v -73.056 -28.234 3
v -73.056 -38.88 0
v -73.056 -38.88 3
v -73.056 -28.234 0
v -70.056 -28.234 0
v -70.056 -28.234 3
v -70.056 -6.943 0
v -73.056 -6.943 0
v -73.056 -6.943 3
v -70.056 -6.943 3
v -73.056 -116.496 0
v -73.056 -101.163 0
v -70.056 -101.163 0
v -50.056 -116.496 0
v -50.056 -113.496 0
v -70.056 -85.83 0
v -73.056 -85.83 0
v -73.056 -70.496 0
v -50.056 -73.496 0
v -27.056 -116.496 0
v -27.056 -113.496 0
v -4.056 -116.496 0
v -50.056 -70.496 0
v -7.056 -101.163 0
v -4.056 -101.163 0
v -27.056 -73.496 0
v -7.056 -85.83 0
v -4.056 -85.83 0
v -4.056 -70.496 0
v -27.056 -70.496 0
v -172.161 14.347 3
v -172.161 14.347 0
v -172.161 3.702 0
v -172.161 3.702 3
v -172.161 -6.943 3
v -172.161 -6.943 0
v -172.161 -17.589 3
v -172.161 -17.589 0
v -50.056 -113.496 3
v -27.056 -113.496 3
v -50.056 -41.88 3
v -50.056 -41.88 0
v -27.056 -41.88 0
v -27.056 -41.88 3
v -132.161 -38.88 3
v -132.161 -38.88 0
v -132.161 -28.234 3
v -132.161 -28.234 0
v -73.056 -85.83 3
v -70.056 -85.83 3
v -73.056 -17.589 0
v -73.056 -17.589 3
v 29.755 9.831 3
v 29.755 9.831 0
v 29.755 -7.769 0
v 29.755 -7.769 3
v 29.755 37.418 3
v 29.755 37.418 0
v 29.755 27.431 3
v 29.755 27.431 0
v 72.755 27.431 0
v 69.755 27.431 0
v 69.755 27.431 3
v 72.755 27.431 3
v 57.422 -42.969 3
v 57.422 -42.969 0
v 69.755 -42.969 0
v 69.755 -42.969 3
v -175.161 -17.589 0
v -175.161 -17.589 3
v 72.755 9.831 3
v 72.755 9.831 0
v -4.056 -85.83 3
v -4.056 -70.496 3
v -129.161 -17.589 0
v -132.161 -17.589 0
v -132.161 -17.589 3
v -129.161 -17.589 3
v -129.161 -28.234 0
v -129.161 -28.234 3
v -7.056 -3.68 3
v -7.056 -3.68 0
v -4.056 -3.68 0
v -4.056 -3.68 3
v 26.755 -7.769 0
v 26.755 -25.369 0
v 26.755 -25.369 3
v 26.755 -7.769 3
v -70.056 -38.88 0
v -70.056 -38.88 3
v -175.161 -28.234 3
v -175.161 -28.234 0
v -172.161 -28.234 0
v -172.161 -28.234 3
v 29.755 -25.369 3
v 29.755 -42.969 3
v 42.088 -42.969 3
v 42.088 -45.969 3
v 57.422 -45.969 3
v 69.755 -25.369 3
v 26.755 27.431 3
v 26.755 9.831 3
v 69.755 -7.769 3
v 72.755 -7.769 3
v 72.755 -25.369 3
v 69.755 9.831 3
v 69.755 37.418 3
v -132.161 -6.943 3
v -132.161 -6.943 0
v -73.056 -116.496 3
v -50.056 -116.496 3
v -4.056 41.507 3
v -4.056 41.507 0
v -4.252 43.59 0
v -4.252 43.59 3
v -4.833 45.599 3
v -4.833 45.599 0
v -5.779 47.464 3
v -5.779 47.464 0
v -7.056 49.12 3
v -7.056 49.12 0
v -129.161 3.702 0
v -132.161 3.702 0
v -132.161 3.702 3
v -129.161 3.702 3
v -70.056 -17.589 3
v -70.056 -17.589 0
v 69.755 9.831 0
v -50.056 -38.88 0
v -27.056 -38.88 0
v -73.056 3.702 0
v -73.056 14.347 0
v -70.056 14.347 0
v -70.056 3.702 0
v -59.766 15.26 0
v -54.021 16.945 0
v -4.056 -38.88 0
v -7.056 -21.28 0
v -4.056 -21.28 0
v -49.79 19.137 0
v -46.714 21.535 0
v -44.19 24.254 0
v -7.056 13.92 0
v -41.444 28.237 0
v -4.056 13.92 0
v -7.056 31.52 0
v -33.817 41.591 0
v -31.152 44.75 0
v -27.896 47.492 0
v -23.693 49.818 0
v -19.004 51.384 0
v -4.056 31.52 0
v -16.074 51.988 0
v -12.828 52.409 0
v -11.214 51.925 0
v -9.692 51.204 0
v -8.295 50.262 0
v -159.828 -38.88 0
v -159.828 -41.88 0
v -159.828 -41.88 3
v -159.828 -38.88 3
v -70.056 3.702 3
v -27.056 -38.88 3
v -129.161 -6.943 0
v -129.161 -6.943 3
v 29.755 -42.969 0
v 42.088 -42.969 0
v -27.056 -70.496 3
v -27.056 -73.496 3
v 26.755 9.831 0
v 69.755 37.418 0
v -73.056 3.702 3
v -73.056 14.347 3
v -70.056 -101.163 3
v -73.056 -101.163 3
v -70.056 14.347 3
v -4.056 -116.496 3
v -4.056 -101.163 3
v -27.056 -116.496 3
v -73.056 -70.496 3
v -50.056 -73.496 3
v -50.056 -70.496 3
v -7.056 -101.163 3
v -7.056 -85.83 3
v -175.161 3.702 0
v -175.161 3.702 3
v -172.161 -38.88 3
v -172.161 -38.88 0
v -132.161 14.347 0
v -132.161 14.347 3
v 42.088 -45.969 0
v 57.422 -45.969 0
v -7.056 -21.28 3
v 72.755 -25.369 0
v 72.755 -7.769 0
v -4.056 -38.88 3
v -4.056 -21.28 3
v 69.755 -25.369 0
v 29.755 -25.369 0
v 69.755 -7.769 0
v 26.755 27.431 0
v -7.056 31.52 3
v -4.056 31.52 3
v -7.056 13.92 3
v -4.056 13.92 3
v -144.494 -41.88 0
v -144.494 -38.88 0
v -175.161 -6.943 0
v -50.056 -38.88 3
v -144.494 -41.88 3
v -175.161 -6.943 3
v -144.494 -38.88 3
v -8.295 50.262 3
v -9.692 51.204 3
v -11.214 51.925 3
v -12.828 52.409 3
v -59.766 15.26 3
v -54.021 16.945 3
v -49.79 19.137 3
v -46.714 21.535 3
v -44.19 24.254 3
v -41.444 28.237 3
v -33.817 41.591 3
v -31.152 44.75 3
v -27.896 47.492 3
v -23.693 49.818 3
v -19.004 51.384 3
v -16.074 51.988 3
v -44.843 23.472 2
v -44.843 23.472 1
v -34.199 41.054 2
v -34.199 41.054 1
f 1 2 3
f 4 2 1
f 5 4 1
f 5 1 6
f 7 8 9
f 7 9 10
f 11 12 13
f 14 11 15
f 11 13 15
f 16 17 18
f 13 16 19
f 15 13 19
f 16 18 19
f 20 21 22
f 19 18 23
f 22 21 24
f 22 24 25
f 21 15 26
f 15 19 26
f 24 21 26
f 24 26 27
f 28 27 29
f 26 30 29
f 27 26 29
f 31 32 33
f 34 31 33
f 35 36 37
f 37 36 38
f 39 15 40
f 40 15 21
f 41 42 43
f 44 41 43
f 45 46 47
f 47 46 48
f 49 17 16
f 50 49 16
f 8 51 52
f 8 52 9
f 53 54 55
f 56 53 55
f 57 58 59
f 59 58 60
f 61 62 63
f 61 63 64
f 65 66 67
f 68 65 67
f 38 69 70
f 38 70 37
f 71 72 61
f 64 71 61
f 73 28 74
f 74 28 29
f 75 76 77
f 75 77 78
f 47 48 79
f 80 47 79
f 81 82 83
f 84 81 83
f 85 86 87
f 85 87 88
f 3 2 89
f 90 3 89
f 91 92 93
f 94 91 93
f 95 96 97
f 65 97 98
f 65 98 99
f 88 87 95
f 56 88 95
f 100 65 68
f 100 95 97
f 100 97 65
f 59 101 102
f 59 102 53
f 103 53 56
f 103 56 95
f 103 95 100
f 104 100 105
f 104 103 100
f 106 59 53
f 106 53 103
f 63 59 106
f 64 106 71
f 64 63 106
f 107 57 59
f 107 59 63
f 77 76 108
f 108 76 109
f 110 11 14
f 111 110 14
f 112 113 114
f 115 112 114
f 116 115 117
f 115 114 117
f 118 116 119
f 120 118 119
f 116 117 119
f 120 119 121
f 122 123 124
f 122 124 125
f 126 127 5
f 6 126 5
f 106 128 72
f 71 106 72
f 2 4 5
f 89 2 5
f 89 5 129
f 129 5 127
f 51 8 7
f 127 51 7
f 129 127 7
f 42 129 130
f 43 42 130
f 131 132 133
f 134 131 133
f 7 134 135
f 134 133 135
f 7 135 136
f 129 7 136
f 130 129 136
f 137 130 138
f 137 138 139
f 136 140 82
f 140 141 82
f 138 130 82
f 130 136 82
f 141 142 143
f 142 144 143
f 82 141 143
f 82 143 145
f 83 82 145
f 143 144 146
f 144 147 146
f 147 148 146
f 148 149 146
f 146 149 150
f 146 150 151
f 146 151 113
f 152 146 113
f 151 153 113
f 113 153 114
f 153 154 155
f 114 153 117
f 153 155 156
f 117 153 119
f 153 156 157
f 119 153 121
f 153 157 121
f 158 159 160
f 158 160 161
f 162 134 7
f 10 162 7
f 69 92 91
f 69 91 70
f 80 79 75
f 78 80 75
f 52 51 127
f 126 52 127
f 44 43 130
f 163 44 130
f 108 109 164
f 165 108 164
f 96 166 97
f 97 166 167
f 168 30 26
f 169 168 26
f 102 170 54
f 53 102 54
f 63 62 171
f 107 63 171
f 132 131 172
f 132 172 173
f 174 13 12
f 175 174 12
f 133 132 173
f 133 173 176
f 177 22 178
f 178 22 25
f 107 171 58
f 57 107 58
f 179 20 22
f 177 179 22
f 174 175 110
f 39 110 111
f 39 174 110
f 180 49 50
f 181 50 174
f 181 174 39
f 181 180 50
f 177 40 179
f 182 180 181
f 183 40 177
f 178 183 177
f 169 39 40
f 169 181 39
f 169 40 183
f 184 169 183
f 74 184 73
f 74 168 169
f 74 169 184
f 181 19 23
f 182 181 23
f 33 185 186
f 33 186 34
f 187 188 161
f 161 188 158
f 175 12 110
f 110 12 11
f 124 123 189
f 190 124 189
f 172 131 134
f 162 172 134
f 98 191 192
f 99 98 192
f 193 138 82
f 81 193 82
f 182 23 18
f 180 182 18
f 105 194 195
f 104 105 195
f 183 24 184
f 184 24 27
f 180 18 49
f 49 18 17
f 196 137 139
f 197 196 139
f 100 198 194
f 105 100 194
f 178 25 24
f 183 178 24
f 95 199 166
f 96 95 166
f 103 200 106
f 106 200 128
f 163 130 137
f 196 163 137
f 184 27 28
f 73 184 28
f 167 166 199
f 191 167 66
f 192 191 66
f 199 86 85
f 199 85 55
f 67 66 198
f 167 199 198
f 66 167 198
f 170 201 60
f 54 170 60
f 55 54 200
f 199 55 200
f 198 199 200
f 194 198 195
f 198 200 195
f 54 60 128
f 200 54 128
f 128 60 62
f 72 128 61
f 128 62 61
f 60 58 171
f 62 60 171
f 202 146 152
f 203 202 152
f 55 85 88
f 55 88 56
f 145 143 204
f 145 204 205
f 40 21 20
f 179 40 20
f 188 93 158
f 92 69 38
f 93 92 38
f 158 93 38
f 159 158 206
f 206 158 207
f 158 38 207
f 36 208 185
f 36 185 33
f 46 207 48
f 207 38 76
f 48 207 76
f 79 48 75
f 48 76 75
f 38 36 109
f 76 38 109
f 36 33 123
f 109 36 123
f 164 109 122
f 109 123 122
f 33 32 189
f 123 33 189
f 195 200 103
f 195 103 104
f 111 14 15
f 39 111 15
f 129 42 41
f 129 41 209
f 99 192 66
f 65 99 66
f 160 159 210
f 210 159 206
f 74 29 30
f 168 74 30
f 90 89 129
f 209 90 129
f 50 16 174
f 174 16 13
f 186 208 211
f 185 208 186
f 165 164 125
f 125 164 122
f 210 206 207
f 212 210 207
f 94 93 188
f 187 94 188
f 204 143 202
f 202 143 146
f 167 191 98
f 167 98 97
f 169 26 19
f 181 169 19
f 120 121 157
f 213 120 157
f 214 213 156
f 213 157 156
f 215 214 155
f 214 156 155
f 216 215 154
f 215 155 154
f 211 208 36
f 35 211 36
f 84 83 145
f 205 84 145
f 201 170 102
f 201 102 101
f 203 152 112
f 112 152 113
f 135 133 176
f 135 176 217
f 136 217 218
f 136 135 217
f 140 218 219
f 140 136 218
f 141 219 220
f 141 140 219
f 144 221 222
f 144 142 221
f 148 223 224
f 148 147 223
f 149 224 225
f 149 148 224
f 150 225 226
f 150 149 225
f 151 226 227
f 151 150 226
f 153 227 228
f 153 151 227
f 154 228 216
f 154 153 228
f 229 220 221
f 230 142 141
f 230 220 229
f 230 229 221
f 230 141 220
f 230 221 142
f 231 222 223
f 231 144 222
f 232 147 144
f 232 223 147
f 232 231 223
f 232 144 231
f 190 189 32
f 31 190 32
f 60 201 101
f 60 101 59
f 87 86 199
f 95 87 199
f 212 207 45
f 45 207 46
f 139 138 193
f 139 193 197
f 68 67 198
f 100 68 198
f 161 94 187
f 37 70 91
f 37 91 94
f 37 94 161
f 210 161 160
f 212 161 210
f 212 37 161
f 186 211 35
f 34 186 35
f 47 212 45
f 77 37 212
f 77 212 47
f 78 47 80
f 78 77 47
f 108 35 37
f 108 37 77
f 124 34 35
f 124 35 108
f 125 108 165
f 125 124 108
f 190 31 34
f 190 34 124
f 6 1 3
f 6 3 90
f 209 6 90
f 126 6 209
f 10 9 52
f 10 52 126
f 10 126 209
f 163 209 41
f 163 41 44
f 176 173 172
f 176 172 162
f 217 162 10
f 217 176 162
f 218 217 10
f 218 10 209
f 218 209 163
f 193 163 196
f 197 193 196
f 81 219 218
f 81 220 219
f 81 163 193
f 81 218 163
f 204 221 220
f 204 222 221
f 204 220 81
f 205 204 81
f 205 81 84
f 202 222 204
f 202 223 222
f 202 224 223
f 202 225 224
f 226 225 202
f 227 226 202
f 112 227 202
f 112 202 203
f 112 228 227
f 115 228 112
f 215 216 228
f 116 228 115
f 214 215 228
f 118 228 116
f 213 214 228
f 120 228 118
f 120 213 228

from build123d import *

# Parameters (mm, degrees)
F0_W     = 3
F0_H     = 17.6
F0_H_2   = 10.645371
F0_H_3   = 10.64537
F0_W_2   = 15.333334
F0_H_4   = 3
F0_W_3   = 23
F1_DEPTH = 3


with BuildPart() as f1:
    # F0 (on Top) → F1 (new body)
    with BuildSketch(Plane.XY):
        with Locations((71.255033, 18.631006)):
            Rectangle(F0_W, F0_H)
        with Locations((71.255033, -16.568994)):
            Rectangle(F0_W, F0_H)
        Polygon((-50.056124, -73.496176), (-70.056124, -73.496176), (-70.056124, -85.829509), (-70.056124, -101.162842), (-70.056124, -113.496176), (-50.056124, -113.496176), (-27.056124, -113.496176), (-7.056124, -113.496176), (-7.056124, -101.162842), (-7.056124, -85.829509), (-7.056124, -73.496176), (-27.056124, -73.496176), align=None)
        Polygon((-132.160997, 14.347353), (-172.160997, 14.347353), (-172.160997, 3.701983), (-172.160997, -6.943388), (-172.160997, -17.588759), (-172.160997, -28.234129), (-172.160997, -38.8795), (-159.827664, -38.8795), (-144.49433, -38.8795), (-132.160997, -38.8795), (-132.160997, -28.234129), (-132.160997, -17.588759), (-132.160997, -6.943388), (-132.160997, 3.701983), align=None)
        Polygon((-7.056124, -113.496176), (-27.056124, -113.496176), (-27.056124, -116.496176), (-4.056124, -116.496176), (-4.056124, -101.162842), (-7.056124, -101.162842), align=None)
        with Locations((-130.660997, -1.620702)):
            Rectangle(F0_W, F0_H_2)
        with Locations((-130.660997, -22.911444)):
            Rectangle(F0_W, F0_H_3)
        with Locations((49.755033, -44.468994)):
            Rectangle(F0_W_2, F0_H_4)
        with Locations((-71.556124, 9.024668)):
            Rectangle(F0_W, F0_H_3)
        with Locations((-71.556124, -12.266073)):
            Rectangle(F0_W, F0_H_2)
        with Locations((-71.556124, -33.556815)):
            Rectangle(F0_W, F0_H_2)
        with Locations((-38.556124, -40.3795)):
            Rectangle(F0_W_3, F0_H_4)
        with Locations((-5.556124, -30.0795)):
            Rectangle(F0_W, F0_H)
        with Locations((-5.556124, 5.1205)):
            Rectangle(F0_W, F0_H)
        with BuildLine():
            ThreePointArc((-4.056124, 41.507353), (-4.833177, 45.598808), (-7.056124, 49.1205))
            Line((-7.056124, 49.1205), (-7.056124, 31.5205))
            Line((-7.056124, 31.5205), (-4.056124, 31.5205))
            Line((-4.056124, 31.5205), (-4.056124, 41.507353))
        make_face()
        with Locations((-173.660997, -1.620702)):
            Rectangle(F0_W, F0_H_2)
        with Locations((-173.660997, -22.911444)):
            Rectangle(F0_W, F0_H_3)
        with Locations((-152.160997, -40.3795)):
            Rectangle(F0_W_2, F0_H_4)
        Polygon((-70.056124, -85.829509), (-70.056124, -73.496176), (-50.056124, -73.496176), (-50.056124, -70.496176), (-73.056124, -70.496176), (-73.056124, -85.829509), align=None)
        Polygon((-70.056124, -113.496176), (-70.056124, -101.162842), (-73.056124, -101.162842), (-73.056124, -116.496176), (-50.056124, -116.496176), (-50.056124, -113.496176), align=None)
        Polygon((-27.056124, -70.496176), (-27.056124, -73.496176), (-7.056124, -73.496176), (-7.056124, -85.829509), (-4.056124, -85.829509), (-4.056124, -70.496176), align=None)
        Polygon((69.755033, 37.417859), (29.755033, 37.417859), (29.755033, 27.431006), (29.755033, 9.831006), (29.755033, -7.768994), (29.755033, -25.368994), (29.755033, -42.968994), (42.088366, -42.968994), (57.4217, -42.968994), (69.755033, -42.968994), (69.755033, -25.368994), (69.755033, -7.768994), (69.755033, 9.831006), (69.755033, 27.431006), align=None)
        with Locations((28.255033, 18.631006)):
            Rectangle(F0_W, F0_H)
        with BuildLine():
            add(Edge.make_bspline(
                [(-70.056124, 14.347353), (-29.12855, 14.347353), (-47.992418, 49.062627), (-12.828256, 52.408898)],
                knots=[0, 0, 0, 0, 70.184964, 70.184964, 70.184964, 70.184964], degree=3))
            Line((-70.056124, 14.347353), (-70.056124, 3.701983))
            Line((-70.056124, 3.701983), (-70.056124, -6.943388))
            Line((-70.056124, -6.943388), (-70.056124, -17.588759))
            Line((-70.056124, -17.588759), (-70.056124, -28.234129))
            Line((-70.056124, -28.234129), (-70.056124, -38.8795))
            Line((-70.056124, -38.8795), (-50.056124, -38.8795))
            Line((-50.056124, -38.8795), (-27.056124, -38.8795))
            Line((-27.056124, -38.8795), (-7.056124, -38.8795))
            Line((-7.056124, -38.8795), (-7.056124, -21.2795))
            Line((-7.056124, -21.2795), (-7.056124, -3.6795))
            Line((-7.056124, -3.6795), (-7.056124, 13.9205))
            Line((-7.056124, 13.9205), (-7.056124, 31.5205))
            Line((-7.056124, 31.5205), (-7.056124, 49.1205))
            ThreePointArc((-7.056124, 49.1205), (-9.691835, 51.204148), (-12.828256, 52.408898))
        make_face()
        with Locations((28.255033, -16.568994)):
            Rectangle(F0_W, F0_H)
    extrude(amount=F1_DEPTH)


solid = f1.part
